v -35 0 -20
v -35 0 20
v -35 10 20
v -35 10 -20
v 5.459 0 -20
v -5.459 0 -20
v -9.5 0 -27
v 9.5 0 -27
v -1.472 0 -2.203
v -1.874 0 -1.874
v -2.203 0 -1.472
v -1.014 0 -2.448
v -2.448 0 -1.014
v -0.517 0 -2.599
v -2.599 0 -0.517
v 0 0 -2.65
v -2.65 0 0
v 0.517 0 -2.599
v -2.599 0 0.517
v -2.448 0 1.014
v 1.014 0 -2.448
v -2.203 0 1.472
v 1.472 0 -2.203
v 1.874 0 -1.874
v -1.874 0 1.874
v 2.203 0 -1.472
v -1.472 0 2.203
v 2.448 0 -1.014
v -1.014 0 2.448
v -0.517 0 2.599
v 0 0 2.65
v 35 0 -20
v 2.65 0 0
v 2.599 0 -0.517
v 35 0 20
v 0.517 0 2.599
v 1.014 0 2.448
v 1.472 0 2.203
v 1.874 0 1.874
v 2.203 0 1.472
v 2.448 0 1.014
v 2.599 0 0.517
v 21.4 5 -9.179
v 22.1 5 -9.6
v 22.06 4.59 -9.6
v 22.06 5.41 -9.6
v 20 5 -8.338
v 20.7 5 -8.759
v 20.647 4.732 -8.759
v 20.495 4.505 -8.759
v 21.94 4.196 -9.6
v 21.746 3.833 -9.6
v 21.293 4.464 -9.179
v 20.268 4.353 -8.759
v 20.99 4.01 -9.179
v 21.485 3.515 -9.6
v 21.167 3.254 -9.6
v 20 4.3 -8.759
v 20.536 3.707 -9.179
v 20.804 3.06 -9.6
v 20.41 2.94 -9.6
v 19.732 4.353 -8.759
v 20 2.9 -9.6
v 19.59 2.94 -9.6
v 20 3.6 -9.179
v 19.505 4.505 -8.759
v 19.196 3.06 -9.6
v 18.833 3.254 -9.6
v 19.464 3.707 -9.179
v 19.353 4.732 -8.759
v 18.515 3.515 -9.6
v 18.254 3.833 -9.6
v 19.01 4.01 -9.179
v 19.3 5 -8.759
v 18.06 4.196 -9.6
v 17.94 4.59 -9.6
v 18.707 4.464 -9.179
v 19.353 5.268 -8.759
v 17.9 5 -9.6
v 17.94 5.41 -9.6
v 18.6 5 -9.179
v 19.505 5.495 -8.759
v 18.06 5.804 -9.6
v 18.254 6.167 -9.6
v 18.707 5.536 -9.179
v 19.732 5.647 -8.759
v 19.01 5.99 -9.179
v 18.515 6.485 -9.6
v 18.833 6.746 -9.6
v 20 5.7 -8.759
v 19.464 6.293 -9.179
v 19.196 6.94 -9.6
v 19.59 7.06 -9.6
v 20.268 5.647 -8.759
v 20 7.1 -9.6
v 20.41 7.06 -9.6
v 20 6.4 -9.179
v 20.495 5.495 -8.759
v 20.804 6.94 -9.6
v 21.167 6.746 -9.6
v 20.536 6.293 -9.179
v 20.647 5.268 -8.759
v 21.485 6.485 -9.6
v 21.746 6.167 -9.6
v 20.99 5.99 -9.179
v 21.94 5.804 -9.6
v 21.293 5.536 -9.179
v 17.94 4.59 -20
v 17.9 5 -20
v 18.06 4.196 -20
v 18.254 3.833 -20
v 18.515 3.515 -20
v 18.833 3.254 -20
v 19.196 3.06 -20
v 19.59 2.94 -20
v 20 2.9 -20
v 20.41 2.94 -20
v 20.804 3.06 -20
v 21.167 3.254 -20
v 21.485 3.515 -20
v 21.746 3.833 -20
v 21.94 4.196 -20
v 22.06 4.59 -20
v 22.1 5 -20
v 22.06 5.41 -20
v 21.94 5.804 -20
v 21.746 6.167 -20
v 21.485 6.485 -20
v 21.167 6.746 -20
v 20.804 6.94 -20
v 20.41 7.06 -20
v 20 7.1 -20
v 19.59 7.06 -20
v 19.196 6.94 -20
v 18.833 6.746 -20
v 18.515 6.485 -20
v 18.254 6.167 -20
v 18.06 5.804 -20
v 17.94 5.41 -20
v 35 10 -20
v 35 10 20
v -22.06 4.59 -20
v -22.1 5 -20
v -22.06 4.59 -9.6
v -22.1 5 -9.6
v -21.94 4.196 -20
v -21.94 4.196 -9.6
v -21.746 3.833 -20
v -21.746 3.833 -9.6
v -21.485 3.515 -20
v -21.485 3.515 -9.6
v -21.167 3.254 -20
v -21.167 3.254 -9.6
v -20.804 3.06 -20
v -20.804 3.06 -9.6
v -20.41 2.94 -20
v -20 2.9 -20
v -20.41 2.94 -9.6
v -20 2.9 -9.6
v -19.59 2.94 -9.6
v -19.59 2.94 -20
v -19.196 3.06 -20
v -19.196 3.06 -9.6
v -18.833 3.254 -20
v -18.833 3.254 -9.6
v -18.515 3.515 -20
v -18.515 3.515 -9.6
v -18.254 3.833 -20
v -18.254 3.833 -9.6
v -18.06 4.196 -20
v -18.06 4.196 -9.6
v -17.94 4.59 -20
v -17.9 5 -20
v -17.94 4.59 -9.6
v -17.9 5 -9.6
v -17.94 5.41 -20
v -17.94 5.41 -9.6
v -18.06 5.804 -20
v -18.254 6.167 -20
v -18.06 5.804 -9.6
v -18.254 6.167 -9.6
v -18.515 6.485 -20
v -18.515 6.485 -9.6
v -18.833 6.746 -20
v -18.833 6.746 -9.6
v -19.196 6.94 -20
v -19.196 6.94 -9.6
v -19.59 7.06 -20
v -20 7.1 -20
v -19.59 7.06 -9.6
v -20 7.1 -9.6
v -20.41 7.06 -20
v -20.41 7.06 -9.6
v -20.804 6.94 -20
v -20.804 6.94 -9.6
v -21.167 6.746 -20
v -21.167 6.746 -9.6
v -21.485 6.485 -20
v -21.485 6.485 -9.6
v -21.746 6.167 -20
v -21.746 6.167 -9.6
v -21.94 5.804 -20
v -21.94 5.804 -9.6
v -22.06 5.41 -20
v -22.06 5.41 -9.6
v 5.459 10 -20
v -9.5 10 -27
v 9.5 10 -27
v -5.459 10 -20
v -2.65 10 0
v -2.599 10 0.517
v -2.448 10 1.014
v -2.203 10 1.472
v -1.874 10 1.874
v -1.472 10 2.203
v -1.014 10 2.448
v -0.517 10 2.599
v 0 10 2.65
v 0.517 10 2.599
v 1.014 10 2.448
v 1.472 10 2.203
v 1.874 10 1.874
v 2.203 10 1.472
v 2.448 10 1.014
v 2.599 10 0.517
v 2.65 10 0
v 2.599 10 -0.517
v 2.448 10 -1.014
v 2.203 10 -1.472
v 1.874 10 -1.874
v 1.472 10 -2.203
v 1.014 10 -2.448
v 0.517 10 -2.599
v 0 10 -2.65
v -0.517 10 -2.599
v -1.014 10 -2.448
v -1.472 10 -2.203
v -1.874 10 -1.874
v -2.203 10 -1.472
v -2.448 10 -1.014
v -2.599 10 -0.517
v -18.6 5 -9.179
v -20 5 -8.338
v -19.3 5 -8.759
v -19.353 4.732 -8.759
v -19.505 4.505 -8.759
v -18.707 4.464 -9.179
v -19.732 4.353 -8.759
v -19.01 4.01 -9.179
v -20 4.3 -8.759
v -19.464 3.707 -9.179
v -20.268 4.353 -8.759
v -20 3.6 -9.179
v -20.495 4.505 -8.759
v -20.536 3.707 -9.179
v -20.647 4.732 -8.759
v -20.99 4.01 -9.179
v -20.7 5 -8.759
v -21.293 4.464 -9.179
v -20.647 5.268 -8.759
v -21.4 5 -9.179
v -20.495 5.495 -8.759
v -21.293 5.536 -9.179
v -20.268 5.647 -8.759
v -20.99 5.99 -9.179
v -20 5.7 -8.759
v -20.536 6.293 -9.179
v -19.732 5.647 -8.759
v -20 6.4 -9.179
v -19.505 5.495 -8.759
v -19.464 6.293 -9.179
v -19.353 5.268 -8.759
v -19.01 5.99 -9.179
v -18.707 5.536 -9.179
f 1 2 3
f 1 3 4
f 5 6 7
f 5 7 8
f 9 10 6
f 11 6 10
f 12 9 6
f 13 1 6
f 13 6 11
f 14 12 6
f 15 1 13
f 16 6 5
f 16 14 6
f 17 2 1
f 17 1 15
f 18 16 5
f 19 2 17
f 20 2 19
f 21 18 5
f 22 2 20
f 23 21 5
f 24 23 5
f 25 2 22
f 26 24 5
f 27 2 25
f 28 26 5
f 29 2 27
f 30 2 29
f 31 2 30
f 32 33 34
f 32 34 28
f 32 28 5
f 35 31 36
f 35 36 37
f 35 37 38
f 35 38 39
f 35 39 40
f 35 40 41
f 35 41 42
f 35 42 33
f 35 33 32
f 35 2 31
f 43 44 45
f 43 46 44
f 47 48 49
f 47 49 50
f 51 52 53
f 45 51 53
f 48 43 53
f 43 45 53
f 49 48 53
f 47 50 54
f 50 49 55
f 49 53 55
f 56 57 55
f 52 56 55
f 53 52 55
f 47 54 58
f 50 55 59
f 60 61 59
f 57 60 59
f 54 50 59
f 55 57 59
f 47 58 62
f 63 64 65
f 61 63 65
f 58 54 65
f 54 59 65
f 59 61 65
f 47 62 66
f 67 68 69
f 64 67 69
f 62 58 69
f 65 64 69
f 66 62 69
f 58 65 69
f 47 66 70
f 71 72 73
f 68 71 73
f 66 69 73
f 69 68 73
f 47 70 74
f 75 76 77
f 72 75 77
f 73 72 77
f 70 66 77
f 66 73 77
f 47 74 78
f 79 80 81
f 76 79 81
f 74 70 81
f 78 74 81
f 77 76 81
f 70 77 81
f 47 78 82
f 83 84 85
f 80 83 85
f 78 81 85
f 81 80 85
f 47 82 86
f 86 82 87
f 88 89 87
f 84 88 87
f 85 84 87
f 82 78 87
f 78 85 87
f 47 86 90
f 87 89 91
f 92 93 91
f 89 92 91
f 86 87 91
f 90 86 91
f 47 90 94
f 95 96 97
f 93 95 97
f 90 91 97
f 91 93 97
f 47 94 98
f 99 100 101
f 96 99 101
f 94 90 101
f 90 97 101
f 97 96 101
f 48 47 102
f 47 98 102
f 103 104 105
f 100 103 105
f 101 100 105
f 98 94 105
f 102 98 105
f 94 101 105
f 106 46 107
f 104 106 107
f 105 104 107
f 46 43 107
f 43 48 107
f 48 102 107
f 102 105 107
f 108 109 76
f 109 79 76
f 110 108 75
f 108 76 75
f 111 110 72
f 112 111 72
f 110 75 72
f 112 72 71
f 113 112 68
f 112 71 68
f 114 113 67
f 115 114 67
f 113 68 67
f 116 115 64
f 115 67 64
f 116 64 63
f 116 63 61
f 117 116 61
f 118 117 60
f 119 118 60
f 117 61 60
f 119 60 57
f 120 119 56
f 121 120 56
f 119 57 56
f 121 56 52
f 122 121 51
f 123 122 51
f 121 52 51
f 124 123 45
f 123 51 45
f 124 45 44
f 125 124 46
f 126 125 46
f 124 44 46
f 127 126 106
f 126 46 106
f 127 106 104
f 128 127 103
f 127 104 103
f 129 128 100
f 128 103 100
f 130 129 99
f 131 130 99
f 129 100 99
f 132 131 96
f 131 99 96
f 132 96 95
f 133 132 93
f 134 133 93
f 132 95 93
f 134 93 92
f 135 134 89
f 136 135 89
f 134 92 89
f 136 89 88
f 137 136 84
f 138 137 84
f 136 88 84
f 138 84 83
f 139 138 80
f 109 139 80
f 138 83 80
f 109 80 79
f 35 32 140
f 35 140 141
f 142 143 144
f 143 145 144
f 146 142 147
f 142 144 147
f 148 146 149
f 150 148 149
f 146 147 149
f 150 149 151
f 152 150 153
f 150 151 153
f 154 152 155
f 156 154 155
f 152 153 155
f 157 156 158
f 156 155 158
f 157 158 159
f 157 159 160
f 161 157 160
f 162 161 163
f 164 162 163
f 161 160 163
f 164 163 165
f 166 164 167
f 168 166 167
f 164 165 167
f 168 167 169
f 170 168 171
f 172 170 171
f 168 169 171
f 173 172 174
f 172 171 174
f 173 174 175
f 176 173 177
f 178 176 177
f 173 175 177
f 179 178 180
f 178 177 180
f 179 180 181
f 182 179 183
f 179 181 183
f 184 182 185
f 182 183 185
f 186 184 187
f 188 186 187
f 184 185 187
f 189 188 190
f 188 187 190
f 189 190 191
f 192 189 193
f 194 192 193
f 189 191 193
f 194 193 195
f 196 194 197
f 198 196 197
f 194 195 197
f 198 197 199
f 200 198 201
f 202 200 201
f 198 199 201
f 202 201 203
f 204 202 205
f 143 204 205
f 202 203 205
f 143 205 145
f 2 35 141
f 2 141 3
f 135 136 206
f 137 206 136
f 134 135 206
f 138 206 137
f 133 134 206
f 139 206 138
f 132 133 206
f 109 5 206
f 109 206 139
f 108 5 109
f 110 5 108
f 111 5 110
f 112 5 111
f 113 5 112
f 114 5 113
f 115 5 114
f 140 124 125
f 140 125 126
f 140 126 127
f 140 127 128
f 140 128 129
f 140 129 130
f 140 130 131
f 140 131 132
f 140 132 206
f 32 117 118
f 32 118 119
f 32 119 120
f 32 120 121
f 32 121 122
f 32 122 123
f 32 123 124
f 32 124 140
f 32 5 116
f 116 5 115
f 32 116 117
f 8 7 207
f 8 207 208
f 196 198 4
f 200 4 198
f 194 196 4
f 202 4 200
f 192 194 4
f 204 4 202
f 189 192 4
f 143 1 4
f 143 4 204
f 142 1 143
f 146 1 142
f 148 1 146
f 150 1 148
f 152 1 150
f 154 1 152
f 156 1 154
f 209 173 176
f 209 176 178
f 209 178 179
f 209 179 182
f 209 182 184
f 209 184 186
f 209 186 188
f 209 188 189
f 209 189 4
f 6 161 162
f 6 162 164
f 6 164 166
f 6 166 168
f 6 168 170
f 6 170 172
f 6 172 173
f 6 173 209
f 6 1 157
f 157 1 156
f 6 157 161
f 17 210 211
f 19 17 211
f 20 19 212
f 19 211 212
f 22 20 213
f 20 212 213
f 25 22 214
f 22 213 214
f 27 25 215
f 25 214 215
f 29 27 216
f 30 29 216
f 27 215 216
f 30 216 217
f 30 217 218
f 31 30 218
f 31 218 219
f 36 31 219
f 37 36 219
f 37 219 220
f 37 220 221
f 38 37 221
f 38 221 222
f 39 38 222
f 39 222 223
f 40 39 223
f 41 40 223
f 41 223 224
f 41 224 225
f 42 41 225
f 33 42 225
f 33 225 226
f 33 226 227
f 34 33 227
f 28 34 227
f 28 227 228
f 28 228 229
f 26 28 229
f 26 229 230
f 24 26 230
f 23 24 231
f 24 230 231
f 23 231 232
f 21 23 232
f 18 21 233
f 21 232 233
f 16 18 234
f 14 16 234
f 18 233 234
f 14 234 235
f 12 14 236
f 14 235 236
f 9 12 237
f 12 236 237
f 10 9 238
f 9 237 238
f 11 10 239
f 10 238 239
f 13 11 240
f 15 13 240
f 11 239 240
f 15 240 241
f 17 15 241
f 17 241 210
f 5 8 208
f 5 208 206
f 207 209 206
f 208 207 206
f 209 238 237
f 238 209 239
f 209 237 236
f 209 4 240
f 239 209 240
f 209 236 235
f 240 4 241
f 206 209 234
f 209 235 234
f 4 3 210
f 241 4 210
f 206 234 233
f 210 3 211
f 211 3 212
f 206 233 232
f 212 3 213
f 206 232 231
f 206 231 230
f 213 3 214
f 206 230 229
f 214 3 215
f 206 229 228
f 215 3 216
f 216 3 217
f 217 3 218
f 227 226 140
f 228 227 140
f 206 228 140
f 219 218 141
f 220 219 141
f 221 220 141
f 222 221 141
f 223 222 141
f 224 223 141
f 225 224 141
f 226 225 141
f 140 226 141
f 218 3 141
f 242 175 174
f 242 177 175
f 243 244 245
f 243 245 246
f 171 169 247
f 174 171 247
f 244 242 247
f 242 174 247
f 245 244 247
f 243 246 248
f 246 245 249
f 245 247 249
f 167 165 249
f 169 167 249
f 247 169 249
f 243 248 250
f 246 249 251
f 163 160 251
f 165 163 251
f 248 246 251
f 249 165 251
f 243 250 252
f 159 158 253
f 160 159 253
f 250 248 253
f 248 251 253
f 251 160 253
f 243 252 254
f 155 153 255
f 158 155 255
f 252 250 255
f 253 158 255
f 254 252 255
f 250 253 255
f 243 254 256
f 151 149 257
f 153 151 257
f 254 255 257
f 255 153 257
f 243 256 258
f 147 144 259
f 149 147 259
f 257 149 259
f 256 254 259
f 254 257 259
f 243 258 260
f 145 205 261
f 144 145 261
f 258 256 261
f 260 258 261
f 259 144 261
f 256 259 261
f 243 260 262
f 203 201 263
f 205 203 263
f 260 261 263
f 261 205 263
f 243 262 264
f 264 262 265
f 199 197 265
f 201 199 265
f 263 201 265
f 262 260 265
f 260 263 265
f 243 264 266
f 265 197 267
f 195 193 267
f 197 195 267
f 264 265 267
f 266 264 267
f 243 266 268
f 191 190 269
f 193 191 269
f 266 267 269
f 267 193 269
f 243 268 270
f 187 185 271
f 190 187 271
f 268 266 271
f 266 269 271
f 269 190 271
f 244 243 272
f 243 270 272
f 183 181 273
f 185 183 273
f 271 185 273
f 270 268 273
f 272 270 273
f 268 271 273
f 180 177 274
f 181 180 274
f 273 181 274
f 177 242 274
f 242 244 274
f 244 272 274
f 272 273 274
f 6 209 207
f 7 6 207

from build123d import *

# Parameters (mm, degrees)
F1_DEPTH = 10
F2_D     = 5.3
F4_D     = 4.2
F4_DEPTH = 10.4
F4_TIP   = 1.2618073


with BuildPart() as f1:
    # F0 (on Front) → F1 (new body)
    with BuildSketch(Plane.XZ):
        Polygon((35, -20), (35, 0), (35, 20), (-35, 20), (-35, -20), (-5.4585481157, -20), (-9.5, -27), (0, -27), (9.5, -27), (5.4585481157, -20), align=None)
    extrude(amount=-F1_DEPTH)

    # F2 (through all)
    with Locations(Plane.XZ):
        with Locations((0, 0)):
            Hole(F2_D / 2)

    # F4
    with Locations(Plane(origin=(0, 0, -20), x_dir=(1, 0, 0), z_dir=(0, 0, -1))):
        with Locations((-20, -5), (20, -5)):
            Hole(F4_D / 2, depth=F4_DEPTH)
            with Locations((0, 0, -(F4_DEPTH + F4_TIP / 2))):  # 118° drill point
                Cone(0, F4_D / 2, F4_TIP, mode=Mode.SUBTRACT)


solid = f1.part
